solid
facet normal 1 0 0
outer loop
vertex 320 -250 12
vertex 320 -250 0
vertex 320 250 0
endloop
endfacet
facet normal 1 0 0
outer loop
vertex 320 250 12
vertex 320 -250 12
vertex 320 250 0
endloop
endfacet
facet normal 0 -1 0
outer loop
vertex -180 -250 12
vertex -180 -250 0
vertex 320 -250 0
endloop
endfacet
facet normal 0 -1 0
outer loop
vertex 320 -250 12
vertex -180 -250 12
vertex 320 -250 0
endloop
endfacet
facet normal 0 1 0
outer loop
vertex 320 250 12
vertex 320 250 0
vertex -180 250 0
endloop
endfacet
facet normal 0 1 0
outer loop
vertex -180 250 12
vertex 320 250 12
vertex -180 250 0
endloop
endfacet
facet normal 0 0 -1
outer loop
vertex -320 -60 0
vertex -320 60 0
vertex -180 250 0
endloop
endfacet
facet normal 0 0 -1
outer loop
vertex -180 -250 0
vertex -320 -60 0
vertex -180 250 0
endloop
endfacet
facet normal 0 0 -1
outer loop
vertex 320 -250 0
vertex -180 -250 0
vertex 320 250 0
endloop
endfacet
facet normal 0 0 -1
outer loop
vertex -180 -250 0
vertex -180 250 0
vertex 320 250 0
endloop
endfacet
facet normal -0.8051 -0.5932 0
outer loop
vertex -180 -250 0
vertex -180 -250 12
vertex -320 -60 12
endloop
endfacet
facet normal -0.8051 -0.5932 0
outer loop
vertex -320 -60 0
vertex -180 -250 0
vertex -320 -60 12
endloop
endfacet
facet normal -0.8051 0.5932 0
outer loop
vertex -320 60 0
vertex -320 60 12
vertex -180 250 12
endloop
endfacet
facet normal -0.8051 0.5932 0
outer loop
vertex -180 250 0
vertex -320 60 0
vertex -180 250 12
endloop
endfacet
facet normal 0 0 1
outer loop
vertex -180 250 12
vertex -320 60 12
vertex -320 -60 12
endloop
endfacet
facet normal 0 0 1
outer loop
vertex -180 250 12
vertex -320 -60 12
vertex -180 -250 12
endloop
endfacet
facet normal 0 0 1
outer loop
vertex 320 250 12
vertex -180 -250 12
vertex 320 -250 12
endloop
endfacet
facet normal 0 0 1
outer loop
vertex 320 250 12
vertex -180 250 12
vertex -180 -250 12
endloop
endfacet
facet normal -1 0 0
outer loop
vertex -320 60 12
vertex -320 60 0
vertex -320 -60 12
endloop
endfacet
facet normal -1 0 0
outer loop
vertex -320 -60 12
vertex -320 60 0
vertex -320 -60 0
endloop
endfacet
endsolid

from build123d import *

# Parameters (mm, degrees)
F1_DEPTH = 12
F3_DEPTH = 25


with BuildPart() as f1:
    # F0 (on Top) → F1 (new body)
    with BuildSketch(Plane.XY):
        Polygon((320, 250), (-320, 250), (-320, 21.803056), (-320, -88.196944), (-320, -250), (320, -250), align=None)
    extrude(amount=F1_DEPTH)

    # F2 (on face) → F3 (cut)
    with BuildSketch(Plane.XY.offset(12)):
        Polygon((-320, 60), (-180, 250), (-320, 250), align=None)
        Polygon((-320, -250), (-180, -250), (-320, -60), align=None)
    extrude(amount=-F3_DEPTH, mode=Mode.SUBTRACT)


solid = f1.part
